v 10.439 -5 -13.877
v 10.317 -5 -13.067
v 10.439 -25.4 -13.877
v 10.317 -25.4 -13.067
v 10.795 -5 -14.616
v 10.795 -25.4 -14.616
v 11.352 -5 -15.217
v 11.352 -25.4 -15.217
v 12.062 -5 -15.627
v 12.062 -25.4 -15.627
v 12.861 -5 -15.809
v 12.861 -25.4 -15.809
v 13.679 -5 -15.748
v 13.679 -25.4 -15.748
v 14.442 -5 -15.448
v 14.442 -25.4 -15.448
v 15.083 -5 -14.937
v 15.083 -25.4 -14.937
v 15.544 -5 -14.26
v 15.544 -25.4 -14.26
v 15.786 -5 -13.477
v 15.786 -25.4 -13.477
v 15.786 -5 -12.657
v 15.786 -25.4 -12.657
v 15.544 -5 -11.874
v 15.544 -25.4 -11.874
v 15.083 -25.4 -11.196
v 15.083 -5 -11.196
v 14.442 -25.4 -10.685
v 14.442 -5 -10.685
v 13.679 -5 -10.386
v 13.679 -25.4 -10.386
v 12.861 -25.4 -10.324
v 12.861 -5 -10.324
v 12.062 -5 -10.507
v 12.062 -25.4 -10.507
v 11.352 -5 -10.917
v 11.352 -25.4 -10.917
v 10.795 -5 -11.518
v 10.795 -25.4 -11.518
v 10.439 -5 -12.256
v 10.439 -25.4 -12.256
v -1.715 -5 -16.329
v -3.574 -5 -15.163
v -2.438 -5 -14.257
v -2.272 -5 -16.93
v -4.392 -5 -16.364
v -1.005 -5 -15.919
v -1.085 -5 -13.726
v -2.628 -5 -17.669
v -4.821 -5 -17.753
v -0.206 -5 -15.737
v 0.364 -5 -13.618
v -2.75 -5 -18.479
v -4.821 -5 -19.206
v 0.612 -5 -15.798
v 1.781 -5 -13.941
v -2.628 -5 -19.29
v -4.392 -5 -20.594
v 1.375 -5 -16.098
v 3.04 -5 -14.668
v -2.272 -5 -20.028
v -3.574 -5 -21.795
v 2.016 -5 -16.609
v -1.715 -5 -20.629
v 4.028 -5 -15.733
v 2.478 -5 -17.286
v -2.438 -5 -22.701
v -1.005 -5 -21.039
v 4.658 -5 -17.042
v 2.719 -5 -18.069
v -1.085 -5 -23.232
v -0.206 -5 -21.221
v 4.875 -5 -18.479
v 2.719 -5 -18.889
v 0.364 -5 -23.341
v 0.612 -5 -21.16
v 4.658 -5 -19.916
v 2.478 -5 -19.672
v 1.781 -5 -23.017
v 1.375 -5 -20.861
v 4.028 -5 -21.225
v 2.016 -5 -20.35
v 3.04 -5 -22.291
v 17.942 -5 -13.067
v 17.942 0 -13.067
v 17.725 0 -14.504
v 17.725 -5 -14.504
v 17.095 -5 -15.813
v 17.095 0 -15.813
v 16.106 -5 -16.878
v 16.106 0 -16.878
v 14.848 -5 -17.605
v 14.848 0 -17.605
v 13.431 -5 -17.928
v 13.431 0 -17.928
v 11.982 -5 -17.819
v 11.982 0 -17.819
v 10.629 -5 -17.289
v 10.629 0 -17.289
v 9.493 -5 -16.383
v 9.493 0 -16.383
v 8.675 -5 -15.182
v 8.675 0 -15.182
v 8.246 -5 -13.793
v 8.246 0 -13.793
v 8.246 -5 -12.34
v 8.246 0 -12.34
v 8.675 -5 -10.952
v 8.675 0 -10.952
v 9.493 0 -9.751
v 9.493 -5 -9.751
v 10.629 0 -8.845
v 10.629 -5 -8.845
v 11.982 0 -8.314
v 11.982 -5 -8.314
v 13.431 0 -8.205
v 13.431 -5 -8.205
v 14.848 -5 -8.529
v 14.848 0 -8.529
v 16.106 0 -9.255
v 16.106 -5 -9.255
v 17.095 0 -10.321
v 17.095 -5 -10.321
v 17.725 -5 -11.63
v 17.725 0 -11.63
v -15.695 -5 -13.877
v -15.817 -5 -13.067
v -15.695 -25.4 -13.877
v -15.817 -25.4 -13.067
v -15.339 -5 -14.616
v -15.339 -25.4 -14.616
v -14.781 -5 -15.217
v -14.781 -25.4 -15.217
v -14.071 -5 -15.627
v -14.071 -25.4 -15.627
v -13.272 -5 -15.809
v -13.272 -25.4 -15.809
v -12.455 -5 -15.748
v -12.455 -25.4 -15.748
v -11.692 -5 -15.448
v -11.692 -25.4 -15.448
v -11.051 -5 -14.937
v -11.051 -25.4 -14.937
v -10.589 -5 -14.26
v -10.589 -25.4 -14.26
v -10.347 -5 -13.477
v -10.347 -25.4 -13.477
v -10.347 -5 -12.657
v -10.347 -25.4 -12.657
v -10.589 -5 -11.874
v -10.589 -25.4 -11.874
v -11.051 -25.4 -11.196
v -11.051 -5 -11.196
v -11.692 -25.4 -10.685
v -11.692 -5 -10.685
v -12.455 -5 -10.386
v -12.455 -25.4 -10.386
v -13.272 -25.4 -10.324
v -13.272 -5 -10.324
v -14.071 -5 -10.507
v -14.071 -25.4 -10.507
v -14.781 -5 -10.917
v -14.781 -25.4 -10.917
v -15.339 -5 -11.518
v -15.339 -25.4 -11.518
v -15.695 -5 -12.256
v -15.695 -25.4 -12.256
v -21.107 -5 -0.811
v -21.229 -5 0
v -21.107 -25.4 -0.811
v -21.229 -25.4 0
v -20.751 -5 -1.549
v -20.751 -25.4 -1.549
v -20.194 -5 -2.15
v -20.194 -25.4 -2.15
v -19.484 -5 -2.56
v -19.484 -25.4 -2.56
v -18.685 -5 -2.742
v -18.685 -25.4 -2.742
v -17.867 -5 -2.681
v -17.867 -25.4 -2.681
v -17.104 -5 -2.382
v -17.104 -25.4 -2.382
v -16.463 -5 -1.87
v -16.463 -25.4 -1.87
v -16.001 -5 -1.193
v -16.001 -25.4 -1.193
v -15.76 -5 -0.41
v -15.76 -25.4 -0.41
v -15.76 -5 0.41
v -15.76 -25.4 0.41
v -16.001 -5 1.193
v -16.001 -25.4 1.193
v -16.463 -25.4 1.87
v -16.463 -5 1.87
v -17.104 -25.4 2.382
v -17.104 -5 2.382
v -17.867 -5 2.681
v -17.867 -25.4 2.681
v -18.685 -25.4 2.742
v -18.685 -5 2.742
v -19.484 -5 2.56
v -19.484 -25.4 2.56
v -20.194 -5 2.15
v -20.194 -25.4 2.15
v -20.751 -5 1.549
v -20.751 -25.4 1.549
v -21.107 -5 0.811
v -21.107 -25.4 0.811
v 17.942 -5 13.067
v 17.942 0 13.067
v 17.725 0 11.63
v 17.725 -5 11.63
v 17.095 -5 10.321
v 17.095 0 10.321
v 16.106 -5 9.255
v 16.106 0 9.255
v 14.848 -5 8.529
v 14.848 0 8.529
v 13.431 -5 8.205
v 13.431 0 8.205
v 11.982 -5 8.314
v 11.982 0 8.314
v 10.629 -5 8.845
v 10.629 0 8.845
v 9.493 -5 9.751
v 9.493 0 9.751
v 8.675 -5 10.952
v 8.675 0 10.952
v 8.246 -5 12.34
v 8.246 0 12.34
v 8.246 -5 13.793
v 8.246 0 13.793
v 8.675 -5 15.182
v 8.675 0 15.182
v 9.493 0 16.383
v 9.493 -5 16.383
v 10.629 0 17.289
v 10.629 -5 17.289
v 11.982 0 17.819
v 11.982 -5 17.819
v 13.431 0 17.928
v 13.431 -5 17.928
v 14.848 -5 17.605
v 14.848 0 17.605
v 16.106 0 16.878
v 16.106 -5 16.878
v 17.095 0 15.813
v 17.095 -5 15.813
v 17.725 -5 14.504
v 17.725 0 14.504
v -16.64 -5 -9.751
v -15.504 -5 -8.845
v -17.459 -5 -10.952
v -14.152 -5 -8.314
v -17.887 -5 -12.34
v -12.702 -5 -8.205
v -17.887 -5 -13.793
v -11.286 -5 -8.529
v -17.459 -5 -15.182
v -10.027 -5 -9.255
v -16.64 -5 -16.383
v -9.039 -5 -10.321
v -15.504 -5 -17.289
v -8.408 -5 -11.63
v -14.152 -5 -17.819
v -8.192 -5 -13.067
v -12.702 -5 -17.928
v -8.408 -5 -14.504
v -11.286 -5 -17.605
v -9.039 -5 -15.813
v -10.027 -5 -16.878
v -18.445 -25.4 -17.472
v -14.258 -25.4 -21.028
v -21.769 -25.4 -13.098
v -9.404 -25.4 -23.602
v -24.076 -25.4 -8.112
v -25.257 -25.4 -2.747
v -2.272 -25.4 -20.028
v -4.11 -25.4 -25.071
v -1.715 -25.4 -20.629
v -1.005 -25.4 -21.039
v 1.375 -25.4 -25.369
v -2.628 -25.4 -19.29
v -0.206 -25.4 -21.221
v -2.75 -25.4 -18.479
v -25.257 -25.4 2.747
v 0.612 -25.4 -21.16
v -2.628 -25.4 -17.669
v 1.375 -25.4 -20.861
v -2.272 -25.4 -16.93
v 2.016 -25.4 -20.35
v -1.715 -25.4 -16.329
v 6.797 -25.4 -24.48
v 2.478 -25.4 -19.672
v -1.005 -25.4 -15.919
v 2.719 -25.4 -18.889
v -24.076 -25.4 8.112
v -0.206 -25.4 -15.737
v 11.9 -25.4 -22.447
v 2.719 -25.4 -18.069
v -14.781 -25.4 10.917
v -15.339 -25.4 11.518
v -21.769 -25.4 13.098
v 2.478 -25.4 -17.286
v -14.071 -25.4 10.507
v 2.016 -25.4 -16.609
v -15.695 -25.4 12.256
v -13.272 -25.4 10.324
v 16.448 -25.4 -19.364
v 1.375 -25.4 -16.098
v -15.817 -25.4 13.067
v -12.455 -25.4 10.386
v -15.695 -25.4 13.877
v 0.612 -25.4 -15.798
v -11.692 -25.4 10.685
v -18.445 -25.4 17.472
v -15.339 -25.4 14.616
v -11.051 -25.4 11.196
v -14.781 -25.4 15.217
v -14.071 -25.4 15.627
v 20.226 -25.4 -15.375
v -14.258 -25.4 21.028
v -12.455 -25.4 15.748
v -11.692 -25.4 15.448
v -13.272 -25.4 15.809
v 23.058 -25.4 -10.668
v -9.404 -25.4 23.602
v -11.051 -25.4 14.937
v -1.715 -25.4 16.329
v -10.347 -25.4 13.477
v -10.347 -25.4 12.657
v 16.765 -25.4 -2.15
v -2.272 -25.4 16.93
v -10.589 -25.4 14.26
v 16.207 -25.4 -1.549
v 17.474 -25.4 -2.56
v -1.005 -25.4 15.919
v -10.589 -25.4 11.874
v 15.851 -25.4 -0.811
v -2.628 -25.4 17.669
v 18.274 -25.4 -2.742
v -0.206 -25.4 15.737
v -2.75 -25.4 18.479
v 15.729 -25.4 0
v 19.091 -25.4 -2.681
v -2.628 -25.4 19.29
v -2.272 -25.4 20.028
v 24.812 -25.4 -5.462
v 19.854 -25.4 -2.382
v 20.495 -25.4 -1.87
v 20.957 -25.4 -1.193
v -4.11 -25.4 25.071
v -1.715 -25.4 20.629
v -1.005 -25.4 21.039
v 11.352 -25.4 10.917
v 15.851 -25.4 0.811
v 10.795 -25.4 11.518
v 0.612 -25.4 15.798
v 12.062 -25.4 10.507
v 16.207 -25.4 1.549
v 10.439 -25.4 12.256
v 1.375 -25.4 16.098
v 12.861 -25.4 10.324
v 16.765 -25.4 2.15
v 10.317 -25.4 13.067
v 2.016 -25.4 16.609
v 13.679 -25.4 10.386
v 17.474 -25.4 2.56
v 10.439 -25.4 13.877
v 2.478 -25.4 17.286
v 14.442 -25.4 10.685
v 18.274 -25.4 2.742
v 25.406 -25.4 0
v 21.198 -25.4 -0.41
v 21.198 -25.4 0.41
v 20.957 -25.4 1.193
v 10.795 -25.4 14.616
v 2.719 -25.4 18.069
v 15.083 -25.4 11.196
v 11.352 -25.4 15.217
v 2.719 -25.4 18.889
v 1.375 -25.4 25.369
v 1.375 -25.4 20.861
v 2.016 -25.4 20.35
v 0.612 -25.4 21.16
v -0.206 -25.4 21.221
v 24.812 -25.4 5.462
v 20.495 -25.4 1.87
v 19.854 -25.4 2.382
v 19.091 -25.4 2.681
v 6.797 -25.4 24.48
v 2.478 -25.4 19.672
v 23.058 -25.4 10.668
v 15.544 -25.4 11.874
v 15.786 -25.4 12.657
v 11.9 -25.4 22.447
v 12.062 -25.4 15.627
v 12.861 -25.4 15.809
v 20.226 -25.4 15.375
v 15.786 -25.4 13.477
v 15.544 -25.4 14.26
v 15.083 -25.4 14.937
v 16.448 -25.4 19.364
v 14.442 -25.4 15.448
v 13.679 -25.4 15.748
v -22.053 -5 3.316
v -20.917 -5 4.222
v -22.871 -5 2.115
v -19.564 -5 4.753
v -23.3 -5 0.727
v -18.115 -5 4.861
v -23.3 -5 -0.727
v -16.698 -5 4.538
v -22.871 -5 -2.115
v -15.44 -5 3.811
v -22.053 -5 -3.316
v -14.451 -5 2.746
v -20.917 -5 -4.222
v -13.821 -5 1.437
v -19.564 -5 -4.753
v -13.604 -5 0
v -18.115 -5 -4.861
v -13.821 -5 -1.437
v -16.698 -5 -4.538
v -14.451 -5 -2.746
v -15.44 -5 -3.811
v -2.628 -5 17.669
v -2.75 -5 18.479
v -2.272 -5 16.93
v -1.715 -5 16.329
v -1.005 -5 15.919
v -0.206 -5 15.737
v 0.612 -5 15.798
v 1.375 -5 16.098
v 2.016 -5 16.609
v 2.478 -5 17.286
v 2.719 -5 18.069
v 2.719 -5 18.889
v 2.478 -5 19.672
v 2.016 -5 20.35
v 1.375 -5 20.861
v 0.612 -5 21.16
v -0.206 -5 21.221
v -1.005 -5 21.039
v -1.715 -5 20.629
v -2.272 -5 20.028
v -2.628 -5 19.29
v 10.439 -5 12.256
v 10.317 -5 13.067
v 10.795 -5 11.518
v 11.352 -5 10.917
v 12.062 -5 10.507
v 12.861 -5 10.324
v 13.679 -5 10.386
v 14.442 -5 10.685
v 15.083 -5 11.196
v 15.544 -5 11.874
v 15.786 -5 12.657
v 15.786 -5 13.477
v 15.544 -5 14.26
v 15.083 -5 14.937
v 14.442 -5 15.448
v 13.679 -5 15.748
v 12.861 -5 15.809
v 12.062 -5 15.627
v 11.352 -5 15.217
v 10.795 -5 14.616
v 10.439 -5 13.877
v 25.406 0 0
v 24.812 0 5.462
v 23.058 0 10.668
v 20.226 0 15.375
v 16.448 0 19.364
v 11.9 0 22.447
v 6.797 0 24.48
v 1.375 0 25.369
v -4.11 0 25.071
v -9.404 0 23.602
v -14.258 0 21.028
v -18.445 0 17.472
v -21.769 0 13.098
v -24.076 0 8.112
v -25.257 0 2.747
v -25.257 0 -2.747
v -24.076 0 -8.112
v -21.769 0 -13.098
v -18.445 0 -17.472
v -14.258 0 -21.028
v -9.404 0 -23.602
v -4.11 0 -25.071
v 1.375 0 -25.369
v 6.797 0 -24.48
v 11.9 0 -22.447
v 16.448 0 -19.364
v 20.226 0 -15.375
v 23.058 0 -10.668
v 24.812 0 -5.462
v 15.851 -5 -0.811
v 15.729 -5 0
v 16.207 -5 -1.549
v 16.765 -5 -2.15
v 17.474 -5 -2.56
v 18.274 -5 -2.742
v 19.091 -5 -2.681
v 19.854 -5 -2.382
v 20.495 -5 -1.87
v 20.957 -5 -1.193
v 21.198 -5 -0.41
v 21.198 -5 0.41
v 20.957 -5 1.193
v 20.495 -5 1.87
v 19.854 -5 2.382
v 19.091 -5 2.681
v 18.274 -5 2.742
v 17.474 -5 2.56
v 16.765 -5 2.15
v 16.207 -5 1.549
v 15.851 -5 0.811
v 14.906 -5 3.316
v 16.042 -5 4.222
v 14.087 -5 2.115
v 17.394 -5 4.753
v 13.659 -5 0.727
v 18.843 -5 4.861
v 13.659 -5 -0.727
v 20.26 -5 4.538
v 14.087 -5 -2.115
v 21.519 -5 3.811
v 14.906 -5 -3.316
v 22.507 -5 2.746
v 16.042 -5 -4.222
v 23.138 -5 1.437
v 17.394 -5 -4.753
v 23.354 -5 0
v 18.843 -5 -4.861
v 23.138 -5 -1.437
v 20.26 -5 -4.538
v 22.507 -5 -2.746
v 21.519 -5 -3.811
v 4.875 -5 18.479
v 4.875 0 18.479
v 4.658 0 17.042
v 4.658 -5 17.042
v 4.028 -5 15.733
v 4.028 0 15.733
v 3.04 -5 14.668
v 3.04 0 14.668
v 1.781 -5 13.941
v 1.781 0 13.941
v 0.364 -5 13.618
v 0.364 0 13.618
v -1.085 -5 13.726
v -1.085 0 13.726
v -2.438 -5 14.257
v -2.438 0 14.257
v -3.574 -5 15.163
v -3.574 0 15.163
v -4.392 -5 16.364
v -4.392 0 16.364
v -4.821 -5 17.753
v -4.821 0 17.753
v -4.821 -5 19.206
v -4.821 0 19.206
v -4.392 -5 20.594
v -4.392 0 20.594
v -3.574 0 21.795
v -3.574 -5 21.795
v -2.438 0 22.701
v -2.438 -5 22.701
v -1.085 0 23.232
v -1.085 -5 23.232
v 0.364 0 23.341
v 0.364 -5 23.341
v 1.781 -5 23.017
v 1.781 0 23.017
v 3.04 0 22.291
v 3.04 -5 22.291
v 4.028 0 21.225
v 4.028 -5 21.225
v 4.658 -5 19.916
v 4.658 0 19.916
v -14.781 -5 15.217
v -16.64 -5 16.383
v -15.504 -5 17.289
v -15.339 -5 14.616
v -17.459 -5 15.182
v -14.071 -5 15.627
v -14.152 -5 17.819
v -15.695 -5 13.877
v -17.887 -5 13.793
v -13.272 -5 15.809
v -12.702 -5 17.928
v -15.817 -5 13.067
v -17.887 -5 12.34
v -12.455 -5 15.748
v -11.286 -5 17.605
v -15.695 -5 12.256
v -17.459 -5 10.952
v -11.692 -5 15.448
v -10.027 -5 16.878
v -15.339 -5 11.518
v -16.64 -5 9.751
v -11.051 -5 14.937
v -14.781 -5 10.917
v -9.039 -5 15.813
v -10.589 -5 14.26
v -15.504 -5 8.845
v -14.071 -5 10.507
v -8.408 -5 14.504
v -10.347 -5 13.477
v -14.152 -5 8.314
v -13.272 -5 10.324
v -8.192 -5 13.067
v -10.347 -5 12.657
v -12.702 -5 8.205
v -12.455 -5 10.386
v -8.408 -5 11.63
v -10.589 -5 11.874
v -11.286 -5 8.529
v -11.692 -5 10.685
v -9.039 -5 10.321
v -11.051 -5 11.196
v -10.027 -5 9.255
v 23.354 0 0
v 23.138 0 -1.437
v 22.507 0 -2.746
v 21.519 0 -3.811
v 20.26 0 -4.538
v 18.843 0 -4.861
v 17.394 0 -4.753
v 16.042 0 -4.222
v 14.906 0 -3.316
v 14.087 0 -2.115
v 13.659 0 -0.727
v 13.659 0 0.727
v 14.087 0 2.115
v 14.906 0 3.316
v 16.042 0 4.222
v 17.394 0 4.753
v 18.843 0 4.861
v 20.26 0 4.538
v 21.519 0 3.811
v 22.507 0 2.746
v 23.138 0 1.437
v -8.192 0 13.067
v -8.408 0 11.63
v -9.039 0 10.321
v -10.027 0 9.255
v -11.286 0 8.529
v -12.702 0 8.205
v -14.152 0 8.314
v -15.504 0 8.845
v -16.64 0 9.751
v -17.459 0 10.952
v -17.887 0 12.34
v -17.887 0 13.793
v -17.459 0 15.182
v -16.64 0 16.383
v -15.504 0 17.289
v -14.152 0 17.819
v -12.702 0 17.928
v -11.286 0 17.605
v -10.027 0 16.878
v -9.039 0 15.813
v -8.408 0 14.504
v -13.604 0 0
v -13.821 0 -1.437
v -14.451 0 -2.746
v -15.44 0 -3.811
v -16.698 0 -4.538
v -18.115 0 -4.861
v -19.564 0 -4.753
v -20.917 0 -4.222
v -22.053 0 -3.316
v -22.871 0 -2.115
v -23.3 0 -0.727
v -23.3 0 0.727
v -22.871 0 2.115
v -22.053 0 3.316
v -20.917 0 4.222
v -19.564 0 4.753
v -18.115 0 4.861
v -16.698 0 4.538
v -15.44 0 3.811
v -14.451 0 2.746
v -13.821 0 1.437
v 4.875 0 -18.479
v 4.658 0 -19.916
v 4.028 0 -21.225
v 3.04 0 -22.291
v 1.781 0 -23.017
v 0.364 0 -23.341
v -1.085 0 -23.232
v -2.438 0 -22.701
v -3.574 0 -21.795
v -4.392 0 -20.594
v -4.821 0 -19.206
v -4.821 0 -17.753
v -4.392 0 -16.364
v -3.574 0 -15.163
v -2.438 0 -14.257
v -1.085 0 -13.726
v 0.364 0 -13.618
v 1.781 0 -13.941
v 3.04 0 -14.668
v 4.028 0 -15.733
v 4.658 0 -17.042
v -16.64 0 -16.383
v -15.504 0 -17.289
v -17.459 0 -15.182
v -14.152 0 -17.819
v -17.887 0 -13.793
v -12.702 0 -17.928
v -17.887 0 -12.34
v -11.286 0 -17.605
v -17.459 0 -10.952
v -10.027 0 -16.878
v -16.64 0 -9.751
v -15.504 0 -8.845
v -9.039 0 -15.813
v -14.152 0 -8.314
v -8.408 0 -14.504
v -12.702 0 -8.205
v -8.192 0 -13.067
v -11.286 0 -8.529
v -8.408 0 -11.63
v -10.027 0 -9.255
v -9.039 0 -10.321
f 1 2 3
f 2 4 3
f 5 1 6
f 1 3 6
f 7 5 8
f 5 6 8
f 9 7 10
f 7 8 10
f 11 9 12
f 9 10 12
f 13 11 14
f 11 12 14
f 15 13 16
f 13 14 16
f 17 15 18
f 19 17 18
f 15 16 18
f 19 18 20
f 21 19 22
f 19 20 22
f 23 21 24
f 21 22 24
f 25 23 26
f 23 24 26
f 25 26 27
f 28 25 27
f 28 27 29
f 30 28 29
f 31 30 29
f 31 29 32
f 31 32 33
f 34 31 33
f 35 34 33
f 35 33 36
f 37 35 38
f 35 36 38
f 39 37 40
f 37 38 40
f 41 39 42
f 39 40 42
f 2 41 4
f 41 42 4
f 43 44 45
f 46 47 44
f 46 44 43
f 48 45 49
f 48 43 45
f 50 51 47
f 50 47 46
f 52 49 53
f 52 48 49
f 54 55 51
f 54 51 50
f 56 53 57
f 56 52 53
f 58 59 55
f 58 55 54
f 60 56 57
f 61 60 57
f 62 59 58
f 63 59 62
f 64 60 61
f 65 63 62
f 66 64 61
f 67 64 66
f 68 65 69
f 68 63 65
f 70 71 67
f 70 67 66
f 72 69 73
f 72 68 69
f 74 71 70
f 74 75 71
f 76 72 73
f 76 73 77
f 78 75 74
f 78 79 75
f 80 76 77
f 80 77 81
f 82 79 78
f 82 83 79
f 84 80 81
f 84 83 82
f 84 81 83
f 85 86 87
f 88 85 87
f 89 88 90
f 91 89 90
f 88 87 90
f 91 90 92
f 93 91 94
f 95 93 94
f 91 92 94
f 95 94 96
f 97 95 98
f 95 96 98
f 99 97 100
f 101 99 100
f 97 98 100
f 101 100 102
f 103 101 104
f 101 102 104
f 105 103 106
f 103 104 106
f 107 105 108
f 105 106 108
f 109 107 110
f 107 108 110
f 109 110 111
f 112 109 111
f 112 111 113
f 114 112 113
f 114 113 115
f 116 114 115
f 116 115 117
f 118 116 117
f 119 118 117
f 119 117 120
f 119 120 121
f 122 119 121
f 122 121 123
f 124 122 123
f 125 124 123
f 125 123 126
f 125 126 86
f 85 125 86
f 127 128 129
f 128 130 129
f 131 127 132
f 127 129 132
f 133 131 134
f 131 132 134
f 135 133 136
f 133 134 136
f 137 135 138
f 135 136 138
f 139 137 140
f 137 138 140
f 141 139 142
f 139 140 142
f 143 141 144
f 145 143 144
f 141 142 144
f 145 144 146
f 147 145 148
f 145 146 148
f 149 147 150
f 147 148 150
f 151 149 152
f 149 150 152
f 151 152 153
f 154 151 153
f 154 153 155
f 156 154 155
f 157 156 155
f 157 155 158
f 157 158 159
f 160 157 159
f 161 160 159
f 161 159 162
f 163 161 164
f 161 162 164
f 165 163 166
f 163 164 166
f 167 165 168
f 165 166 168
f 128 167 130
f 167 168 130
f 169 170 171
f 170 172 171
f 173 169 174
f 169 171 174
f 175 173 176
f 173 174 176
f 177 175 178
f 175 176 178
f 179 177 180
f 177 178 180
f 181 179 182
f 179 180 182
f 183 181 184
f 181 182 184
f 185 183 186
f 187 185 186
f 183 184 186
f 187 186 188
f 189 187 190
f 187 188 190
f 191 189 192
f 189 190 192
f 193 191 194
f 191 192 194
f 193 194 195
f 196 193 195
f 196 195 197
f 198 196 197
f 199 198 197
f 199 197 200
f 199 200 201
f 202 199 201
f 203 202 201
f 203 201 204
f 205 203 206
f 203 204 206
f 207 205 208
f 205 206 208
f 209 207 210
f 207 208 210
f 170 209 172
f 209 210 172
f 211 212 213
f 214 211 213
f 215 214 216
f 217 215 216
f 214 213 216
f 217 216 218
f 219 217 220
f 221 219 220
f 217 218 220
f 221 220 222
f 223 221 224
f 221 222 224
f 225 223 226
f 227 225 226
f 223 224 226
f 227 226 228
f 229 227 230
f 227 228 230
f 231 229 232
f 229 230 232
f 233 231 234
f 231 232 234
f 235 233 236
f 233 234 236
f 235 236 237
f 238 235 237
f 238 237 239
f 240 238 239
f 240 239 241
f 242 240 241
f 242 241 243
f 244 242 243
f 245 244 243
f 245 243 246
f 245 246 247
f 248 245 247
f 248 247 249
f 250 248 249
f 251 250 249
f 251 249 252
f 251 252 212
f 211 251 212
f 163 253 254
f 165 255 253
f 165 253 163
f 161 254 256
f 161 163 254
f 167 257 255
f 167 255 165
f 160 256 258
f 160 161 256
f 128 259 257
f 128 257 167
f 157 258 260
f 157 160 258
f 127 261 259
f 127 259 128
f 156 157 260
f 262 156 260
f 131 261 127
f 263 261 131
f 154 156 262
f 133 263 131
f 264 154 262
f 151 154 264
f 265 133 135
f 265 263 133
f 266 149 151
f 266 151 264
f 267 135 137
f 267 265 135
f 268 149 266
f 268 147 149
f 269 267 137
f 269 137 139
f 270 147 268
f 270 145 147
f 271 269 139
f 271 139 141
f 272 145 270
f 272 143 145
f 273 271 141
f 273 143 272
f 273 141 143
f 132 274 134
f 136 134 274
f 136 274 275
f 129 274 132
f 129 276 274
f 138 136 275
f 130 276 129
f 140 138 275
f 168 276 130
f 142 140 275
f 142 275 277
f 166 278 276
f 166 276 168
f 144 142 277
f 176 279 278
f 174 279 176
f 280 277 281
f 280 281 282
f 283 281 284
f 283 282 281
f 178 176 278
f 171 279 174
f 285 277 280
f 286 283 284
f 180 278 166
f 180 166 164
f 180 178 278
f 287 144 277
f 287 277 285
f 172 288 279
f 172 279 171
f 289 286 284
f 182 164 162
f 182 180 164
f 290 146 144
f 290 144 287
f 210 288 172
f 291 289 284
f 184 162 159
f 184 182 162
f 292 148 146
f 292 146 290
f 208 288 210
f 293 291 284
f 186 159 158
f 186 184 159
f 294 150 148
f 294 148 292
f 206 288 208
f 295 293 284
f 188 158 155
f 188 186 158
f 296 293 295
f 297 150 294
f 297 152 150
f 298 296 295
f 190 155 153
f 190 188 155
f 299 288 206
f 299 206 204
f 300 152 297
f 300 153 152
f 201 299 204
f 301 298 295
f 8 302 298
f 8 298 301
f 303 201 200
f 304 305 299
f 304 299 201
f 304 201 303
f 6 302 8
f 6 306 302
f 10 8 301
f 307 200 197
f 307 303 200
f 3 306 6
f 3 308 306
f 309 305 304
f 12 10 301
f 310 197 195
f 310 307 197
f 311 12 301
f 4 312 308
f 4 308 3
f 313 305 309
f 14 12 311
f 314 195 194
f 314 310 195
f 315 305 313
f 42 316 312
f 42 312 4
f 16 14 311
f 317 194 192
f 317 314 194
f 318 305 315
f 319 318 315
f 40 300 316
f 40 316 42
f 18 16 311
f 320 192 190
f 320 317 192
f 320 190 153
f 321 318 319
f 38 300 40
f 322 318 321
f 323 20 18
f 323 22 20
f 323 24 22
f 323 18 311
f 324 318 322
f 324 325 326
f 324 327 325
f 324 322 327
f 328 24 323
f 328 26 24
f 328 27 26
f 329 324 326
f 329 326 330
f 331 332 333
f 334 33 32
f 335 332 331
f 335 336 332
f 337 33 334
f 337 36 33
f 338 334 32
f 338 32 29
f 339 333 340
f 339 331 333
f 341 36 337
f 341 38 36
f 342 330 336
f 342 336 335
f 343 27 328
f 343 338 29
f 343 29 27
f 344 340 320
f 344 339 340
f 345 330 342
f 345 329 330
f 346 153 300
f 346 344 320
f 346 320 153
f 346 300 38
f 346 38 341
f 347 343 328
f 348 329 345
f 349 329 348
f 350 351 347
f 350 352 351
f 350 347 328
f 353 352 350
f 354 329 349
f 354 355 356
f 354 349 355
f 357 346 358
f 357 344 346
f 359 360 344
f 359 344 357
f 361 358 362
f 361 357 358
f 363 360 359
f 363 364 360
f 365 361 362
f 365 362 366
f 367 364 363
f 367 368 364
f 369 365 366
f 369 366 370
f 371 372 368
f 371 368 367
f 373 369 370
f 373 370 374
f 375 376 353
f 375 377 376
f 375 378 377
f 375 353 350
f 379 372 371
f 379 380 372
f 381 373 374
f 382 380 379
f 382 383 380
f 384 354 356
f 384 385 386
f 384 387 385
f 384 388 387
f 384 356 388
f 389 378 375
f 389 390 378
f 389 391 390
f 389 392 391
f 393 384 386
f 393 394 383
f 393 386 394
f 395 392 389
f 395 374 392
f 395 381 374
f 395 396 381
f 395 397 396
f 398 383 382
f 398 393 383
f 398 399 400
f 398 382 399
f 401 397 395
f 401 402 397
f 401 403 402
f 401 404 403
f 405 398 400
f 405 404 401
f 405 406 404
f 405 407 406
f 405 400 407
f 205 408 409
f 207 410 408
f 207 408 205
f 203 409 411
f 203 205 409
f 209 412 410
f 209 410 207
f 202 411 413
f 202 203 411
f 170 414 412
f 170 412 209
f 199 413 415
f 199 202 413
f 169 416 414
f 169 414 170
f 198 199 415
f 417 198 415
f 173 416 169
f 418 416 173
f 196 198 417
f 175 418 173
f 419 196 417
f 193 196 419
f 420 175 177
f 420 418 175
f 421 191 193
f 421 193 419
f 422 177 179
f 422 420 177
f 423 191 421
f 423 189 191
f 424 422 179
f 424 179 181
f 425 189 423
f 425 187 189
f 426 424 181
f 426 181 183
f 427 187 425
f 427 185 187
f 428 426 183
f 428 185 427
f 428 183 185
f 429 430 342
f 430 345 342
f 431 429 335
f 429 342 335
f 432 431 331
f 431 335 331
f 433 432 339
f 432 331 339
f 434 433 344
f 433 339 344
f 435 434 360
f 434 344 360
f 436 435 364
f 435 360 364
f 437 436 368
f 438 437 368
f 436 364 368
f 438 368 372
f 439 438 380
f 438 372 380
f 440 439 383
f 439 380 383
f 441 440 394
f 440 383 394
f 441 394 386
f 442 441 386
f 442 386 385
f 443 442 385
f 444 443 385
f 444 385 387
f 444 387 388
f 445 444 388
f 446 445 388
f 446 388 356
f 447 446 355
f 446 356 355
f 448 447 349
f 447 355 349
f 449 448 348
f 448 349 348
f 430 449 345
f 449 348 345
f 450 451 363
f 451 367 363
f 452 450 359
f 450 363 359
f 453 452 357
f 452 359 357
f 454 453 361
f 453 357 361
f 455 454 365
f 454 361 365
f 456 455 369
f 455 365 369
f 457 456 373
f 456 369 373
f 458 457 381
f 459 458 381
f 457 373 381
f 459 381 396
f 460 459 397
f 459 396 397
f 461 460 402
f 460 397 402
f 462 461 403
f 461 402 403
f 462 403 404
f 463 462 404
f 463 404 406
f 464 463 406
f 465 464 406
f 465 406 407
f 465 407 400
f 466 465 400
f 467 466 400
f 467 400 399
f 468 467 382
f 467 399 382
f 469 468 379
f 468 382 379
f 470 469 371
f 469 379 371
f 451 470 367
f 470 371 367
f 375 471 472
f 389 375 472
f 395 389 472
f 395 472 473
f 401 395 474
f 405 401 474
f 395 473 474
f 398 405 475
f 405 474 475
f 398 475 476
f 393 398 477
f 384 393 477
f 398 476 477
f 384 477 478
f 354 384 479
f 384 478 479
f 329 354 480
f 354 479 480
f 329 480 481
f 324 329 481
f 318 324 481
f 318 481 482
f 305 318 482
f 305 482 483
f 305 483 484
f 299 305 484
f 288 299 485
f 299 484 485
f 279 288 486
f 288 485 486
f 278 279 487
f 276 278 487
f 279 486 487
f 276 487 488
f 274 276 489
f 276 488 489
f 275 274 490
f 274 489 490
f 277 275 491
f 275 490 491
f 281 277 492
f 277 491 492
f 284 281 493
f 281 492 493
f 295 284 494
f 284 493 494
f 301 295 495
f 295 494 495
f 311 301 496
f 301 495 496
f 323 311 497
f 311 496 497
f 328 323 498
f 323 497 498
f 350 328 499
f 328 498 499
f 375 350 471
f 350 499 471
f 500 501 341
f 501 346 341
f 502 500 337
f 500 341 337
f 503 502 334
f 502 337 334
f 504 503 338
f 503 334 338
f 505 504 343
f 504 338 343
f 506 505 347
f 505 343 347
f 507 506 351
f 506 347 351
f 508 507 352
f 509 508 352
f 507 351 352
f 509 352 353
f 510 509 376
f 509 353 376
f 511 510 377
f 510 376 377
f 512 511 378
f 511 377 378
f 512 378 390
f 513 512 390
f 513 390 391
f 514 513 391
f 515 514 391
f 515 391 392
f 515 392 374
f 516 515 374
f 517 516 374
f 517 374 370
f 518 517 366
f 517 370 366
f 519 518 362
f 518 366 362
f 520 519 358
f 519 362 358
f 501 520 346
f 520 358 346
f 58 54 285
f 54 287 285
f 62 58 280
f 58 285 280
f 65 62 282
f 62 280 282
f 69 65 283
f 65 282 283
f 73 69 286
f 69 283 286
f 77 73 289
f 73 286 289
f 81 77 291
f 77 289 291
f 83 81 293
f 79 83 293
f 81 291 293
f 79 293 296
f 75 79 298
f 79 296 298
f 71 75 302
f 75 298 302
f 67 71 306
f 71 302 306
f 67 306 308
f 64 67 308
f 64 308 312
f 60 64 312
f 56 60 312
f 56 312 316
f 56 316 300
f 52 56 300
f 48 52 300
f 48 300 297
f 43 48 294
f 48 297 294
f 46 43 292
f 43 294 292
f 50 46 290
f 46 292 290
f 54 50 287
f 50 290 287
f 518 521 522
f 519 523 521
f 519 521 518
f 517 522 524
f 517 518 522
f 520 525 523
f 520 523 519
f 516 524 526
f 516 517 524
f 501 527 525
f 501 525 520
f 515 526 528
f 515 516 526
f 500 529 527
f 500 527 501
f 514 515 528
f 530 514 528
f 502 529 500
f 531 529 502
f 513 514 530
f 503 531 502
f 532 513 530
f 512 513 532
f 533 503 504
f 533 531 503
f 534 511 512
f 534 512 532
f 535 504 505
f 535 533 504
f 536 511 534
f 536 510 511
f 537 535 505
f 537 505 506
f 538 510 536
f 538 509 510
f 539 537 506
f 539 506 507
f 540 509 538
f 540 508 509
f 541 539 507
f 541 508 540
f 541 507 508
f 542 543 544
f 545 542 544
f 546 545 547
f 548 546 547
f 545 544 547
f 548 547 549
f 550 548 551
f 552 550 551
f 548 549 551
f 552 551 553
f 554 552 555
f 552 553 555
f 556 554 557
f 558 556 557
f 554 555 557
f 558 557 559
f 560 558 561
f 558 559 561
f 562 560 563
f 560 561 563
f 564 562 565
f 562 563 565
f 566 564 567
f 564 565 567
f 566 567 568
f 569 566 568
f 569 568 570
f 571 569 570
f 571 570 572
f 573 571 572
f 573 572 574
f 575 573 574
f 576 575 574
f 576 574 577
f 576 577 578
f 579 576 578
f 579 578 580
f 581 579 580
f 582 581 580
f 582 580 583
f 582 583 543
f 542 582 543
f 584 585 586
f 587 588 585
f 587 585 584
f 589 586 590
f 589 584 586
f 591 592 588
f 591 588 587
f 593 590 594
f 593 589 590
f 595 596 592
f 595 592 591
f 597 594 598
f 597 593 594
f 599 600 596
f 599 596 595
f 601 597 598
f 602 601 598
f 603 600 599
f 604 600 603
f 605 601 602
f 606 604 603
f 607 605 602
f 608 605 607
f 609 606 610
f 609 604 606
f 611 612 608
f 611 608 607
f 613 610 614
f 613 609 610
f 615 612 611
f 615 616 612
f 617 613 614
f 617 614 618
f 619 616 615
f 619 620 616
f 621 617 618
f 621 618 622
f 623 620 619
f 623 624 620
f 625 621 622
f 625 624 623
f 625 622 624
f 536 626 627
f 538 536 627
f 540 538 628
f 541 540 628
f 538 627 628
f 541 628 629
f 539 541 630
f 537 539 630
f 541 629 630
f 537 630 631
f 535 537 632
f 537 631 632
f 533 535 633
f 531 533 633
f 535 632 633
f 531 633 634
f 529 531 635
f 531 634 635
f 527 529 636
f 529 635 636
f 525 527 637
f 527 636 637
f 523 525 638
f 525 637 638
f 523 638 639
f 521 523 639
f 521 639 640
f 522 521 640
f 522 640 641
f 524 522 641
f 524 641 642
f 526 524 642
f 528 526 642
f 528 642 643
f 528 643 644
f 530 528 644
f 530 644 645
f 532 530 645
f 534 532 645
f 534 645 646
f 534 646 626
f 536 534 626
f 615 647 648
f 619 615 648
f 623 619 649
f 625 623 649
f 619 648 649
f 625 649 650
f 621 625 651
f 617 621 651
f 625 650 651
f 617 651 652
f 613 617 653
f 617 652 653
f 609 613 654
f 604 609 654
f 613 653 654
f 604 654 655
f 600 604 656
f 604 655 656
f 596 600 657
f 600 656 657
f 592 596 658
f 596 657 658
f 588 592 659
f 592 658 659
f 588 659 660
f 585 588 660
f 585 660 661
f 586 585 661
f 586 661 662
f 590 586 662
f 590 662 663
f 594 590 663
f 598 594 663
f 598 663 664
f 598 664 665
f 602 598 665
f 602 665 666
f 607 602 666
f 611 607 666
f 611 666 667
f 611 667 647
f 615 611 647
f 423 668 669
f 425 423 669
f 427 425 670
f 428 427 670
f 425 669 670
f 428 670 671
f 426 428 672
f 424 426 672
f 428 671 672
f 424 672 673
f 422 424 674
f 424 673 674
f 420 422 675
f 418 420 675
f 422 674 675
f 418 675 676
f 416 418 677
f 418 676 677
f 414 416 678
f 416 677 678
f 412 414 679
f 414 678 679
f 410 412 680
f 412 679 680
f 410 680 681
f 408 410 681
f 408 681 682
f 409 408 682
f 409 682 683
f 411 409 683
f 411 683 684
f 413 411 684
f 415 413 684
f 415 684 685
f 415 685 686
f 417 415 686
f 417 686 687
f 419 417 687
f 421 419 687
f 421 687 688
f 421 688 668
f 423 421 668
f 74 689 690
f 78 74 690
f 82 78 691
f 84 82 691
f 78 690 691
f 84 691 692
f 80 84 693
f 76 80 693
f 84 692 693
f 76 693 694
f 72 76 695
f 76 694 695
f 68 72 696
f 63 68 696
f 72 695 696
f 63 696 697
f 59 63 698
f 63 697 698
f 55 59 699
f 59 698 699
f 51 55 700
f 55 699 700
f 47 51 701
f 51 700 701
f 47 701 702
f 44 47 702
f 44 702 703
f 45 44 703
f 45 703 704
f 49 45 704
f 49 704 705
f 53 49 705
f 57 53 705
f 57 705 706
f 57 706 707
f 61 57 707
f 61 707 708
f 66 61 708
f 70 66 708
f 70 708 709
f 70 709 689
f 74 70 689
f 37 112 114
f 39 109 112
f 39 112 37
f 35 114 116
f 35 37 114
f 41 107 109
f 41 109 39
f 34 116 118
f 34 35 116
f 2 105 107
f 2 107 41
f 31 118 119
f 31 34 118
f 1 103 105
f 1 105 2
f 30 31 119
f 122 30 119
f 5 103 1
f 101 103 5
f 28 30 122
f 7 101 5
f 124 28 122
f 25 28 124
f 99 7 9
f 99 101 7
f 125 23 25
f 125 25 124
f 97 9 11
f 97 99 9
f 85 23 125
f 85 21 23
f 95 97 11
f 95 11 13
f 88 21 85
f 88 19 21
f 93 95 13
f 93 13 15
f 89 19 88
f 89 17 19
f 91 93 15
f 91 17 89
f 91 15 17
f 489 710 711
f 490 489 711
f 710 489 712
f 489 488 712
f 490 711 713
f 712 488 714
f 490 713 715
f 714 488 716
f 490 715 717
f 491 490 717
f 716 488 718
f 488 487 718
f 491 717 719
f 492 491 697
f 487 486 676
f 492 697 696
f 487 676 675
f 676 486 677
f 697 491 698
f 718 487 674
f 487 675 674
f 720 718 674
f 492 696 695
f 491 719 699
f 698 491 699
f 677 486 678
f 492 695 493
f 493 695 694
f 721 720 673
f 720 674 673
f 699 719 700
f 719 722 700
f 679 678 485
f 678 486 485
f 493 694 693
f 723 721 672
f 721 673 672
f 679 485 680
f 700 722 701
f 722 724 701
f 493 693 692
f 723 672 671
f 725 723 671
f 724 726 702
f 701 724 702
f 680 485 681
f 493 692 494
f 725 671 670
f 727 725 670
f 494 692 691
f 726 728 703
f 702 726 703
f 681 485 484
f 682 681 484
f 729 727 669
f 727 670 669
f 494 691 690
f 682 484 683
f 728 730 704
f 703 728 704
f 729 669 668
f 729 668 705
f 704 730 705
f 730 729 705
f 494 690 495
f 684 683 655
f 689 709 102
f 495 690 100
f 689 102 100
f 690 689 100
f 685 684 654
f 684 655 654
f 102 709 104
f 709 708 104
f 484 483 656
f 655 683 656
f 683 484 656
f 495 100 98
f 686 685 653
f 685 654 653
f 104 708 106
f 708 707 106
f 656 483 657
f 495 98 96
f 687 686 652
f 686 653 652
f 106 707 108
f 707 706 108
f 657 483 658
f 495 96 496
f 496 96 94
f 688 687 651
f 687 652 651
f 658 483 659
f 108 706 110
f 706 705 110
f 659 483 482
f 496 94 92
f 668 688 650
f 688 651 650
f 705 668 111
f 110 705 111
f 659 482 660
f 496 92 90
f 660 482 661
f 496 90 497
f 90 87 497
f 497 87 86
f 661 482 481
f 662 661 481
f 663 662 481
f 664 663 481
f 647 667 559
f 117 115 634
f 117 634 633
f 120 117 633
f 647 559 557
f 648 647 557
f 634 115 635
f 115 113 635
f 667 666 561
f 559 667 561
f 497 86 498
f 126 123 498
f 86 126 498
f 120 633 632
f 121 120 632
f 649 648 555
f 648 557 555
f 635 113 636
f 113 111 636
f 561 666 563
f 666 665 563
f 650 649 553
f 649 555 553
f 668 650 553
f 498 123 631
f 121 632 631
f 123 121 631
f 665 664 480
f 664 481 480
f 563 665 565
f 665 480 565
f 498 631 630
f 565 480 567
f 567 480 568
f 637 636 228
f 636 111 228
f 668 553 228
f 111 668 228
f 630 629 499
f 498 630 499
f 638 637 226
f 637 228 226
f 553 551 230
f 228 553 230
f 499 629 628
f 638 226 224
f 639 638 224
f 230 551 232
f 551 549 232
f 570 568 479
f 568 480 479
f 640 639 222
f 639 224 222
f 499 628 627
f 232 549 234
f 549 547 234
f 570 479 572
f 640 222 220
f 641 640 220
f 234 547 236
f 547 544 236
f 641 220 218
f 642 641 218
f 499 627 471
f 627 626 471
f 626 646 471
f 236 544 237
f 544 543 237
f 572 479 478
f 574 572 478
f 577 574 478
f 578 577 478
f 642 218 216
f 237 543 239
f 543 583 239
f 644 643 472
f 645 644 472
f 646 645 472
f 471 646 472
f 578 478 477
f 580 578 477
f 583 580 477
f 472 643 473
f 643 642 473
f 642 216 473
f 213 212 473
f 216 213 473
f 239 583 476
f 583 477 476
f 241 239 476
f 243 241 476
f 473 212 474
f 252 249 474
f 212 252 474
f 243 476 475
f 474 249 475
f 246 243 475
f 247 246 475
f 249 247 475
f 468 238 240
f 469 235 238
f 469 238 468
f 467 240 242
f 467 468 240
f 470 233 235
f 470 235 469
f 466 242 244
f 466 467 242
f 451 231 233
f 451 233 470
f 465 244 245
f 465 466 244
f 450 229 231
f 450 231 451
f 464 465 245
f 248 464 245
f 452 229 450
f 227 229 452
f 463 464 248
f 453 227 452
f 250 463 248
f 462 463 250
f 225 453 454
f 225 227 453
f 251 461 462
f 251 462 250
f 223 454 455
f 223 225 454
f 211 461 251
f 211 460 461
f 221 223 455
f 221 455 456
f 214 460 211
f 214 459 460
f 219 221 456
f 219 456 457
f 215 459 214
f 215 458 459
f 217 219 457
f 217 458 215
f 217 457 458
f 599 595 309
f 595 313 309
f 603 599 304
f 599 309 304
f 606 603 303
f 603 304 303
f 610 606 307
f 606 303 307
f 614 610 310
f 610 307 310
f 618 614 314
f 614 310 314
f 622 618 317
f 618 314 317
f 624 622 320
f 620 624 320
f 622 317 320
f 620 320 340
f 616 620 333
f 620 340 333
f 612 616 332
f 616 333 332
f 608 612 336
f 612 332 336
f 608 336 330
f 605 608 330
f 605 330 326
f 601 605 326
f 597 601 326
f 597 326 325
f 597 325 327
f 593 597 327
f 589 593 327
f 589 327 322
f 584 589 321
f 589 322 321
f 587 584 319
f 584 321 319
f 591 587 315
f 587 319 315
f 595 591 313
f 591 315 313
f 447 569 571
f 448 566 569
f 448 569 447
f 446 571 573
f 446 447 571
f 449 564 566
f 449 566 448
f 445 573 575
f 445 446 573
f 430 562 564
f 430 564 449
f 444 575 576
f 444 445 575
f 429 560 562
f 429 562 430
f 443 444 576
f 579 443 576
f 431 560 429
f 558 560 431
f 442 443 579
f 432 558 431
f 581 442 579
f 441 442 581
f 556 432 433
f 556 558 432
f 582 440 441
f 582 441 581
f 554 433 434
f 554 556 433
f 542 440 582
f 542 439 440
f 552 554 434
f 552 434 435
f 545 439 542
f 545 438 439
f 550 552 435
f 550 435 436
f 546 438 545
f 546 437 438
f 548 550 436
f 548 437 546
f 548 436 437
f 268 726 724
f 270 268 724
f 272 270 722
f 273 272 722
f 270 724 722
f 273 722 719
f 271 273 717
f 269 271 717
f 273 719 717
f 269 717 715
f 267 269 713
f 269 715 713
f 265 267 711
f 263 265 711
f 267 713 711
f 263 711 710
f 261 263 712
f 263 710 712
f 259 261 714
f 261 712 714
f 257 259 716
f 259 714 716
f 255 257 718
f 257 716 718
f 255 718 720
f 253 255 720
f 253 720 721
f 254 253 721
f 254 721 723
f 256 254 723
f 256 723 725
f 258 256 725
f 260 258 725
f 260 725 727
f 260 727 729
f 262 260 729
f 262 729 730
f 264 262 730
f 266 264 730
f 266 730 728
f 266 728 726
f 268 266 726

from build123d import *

# Parameters (mm, degrees)
F0_R           = 25.4061794045
F1_DEPTH       = 25.4
F2_D           = 5.5
F2_CBORE_D     = 9.75
F2_CBORE_DEPTH = 5


with BuildPart() as f1:
    # F0 (on Front) → F1 (new body)
    with BuildSketch(Plane.XZ):
        Circle(F0_R)
    extrude(amount=F1_DEPTH)

    # F2 (through all)
    with Locations(Plane(origin=(0, 0, 0), x_dir=(1, 0, 0), z_dir=(0, 1, 0))):
        with Locations((0, -18.4791404754), (-13.0667255406, -13.0667255406), (-18.4791404754, 0), (-13.0667255406, 13.0667255406), (0, 18.4791404754), (13.0667255406, 13.0667255406), (18.4791404754, 0), (13.0667255406, -13.0667255406)):
            CounterBoreHole(F2_D / 2, F2_CBORE_D / 2, F2_CBORE_DEPTH)


solid = f1.part
